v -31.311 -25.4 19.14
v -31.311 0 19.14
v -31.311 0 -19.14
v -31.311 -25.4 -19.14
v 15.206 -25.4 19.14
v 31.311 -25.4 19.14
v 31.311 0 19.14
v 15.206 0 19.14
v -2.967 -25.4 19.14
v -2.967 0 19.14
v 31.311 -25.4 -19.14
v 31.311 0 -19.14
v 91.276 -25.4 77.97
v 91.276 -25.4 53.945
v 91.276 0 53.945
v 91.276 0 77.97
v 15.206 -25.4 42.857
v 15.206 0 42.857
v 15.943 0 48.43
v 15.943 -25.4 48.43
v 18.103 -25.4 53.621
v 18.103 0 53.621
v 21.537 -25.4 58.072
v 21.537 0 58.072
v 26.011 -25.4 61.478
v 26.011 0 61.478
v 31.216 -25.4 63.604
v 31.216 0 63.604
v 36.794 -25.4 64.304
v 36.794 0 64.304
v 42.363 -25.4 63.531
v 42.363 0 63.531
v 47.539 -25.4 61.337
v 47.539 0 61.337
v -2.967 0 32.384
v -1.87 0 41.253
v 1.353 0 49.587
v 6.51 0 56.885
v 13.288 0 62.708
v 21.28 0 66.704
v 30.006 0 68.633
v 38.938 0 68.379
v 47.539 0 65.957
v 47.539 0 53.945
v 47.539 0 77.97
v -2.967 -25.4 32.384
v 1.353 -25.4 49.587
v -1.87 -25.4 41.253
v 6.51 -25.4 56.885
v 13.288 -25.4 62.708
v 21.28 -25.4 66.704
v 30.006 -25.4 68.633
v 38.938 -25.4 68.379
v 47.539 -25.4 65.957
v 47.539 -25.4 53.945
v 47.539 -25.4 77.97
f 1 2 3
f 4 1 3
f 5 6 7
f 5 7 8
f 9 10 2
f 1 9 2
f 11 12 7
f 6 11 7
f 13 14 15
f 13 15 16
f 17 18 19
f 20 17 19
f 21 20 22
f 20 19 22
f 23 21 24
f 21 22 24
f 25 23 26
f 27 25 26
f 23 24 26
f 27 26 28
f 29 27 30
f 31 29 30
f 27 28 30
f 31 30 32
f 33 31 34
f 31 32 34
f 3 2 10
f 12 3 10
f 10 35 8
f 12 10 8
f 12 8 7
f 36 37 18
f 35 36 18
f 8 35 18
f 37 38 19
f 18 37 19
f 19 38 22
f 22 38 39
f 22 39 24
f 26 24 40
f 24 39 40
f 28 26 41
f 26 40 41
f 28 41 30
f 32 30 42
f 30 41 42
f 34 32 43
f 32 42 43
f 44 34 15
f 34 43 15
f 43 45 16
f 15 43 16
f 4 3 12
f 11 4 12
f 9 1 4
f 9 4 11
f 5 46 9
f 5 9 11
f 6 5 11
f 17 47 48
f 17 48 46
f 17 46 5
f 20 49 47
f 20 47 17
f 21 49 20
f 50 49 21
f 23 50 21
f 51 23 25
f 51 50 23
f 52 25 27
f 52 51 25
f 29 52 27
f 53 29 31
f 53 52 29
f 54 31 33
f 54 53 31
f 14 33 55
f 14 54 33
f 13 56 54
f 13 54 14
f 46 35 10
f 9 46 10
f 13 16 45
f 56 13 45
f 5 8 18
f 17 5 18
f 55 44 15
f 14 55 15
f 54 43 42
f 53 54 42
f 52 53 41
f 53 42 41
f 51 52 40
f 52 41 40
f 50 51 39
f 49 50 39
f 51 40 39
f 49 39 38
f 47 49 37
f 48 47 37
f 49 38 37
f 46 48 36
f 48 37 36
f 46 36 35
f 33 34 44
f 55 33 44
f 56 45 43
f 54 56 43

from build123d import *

# Parameters (mm, degrees)
F1_DEPTH = 25.4


with BuildPart() as f1:
    # F0 (on Front) → F1 (new body)
    with BuildSketch(Plane.XZ):
        Polygon((47.539182, 77.96976), (47.539182, 65.957407), (47.539182, 61.33727), (47.539182, 53.945053), (91.276467, 53.945053), (91.276467, 77.96976), align=None)
        with BuildLine():
            Line((-2.96659, 32.384418), (-2.96659, 19.140026))
            Line((-2.96659, 19.140026), (15.205946, 19.140026))
            Line((15.205946, 19.140026), (15.205946, 42.856727))
            ThreePointArc((15.205946, 42.856727), (26.010861, 61.477741), (47.539182, 61.33727))
            Line((47.539182, 61.33727), (47.539182, 65.957407))
            ThreePointArc((47.539182, 65.957407), (13.287985, 62.707588), (-2.96659, 32.384418))
        make_face()
        Polygon((-2.96659, 19.140026), (-31.311143, 19.140026), (-31.311143, -19.140026), (31.311143, -19.140026), (31.311143, 19.140026), (15.205946, 19.140026), align=None)
    extrude(amount=F1_DEPTH)


solid = f1.part
